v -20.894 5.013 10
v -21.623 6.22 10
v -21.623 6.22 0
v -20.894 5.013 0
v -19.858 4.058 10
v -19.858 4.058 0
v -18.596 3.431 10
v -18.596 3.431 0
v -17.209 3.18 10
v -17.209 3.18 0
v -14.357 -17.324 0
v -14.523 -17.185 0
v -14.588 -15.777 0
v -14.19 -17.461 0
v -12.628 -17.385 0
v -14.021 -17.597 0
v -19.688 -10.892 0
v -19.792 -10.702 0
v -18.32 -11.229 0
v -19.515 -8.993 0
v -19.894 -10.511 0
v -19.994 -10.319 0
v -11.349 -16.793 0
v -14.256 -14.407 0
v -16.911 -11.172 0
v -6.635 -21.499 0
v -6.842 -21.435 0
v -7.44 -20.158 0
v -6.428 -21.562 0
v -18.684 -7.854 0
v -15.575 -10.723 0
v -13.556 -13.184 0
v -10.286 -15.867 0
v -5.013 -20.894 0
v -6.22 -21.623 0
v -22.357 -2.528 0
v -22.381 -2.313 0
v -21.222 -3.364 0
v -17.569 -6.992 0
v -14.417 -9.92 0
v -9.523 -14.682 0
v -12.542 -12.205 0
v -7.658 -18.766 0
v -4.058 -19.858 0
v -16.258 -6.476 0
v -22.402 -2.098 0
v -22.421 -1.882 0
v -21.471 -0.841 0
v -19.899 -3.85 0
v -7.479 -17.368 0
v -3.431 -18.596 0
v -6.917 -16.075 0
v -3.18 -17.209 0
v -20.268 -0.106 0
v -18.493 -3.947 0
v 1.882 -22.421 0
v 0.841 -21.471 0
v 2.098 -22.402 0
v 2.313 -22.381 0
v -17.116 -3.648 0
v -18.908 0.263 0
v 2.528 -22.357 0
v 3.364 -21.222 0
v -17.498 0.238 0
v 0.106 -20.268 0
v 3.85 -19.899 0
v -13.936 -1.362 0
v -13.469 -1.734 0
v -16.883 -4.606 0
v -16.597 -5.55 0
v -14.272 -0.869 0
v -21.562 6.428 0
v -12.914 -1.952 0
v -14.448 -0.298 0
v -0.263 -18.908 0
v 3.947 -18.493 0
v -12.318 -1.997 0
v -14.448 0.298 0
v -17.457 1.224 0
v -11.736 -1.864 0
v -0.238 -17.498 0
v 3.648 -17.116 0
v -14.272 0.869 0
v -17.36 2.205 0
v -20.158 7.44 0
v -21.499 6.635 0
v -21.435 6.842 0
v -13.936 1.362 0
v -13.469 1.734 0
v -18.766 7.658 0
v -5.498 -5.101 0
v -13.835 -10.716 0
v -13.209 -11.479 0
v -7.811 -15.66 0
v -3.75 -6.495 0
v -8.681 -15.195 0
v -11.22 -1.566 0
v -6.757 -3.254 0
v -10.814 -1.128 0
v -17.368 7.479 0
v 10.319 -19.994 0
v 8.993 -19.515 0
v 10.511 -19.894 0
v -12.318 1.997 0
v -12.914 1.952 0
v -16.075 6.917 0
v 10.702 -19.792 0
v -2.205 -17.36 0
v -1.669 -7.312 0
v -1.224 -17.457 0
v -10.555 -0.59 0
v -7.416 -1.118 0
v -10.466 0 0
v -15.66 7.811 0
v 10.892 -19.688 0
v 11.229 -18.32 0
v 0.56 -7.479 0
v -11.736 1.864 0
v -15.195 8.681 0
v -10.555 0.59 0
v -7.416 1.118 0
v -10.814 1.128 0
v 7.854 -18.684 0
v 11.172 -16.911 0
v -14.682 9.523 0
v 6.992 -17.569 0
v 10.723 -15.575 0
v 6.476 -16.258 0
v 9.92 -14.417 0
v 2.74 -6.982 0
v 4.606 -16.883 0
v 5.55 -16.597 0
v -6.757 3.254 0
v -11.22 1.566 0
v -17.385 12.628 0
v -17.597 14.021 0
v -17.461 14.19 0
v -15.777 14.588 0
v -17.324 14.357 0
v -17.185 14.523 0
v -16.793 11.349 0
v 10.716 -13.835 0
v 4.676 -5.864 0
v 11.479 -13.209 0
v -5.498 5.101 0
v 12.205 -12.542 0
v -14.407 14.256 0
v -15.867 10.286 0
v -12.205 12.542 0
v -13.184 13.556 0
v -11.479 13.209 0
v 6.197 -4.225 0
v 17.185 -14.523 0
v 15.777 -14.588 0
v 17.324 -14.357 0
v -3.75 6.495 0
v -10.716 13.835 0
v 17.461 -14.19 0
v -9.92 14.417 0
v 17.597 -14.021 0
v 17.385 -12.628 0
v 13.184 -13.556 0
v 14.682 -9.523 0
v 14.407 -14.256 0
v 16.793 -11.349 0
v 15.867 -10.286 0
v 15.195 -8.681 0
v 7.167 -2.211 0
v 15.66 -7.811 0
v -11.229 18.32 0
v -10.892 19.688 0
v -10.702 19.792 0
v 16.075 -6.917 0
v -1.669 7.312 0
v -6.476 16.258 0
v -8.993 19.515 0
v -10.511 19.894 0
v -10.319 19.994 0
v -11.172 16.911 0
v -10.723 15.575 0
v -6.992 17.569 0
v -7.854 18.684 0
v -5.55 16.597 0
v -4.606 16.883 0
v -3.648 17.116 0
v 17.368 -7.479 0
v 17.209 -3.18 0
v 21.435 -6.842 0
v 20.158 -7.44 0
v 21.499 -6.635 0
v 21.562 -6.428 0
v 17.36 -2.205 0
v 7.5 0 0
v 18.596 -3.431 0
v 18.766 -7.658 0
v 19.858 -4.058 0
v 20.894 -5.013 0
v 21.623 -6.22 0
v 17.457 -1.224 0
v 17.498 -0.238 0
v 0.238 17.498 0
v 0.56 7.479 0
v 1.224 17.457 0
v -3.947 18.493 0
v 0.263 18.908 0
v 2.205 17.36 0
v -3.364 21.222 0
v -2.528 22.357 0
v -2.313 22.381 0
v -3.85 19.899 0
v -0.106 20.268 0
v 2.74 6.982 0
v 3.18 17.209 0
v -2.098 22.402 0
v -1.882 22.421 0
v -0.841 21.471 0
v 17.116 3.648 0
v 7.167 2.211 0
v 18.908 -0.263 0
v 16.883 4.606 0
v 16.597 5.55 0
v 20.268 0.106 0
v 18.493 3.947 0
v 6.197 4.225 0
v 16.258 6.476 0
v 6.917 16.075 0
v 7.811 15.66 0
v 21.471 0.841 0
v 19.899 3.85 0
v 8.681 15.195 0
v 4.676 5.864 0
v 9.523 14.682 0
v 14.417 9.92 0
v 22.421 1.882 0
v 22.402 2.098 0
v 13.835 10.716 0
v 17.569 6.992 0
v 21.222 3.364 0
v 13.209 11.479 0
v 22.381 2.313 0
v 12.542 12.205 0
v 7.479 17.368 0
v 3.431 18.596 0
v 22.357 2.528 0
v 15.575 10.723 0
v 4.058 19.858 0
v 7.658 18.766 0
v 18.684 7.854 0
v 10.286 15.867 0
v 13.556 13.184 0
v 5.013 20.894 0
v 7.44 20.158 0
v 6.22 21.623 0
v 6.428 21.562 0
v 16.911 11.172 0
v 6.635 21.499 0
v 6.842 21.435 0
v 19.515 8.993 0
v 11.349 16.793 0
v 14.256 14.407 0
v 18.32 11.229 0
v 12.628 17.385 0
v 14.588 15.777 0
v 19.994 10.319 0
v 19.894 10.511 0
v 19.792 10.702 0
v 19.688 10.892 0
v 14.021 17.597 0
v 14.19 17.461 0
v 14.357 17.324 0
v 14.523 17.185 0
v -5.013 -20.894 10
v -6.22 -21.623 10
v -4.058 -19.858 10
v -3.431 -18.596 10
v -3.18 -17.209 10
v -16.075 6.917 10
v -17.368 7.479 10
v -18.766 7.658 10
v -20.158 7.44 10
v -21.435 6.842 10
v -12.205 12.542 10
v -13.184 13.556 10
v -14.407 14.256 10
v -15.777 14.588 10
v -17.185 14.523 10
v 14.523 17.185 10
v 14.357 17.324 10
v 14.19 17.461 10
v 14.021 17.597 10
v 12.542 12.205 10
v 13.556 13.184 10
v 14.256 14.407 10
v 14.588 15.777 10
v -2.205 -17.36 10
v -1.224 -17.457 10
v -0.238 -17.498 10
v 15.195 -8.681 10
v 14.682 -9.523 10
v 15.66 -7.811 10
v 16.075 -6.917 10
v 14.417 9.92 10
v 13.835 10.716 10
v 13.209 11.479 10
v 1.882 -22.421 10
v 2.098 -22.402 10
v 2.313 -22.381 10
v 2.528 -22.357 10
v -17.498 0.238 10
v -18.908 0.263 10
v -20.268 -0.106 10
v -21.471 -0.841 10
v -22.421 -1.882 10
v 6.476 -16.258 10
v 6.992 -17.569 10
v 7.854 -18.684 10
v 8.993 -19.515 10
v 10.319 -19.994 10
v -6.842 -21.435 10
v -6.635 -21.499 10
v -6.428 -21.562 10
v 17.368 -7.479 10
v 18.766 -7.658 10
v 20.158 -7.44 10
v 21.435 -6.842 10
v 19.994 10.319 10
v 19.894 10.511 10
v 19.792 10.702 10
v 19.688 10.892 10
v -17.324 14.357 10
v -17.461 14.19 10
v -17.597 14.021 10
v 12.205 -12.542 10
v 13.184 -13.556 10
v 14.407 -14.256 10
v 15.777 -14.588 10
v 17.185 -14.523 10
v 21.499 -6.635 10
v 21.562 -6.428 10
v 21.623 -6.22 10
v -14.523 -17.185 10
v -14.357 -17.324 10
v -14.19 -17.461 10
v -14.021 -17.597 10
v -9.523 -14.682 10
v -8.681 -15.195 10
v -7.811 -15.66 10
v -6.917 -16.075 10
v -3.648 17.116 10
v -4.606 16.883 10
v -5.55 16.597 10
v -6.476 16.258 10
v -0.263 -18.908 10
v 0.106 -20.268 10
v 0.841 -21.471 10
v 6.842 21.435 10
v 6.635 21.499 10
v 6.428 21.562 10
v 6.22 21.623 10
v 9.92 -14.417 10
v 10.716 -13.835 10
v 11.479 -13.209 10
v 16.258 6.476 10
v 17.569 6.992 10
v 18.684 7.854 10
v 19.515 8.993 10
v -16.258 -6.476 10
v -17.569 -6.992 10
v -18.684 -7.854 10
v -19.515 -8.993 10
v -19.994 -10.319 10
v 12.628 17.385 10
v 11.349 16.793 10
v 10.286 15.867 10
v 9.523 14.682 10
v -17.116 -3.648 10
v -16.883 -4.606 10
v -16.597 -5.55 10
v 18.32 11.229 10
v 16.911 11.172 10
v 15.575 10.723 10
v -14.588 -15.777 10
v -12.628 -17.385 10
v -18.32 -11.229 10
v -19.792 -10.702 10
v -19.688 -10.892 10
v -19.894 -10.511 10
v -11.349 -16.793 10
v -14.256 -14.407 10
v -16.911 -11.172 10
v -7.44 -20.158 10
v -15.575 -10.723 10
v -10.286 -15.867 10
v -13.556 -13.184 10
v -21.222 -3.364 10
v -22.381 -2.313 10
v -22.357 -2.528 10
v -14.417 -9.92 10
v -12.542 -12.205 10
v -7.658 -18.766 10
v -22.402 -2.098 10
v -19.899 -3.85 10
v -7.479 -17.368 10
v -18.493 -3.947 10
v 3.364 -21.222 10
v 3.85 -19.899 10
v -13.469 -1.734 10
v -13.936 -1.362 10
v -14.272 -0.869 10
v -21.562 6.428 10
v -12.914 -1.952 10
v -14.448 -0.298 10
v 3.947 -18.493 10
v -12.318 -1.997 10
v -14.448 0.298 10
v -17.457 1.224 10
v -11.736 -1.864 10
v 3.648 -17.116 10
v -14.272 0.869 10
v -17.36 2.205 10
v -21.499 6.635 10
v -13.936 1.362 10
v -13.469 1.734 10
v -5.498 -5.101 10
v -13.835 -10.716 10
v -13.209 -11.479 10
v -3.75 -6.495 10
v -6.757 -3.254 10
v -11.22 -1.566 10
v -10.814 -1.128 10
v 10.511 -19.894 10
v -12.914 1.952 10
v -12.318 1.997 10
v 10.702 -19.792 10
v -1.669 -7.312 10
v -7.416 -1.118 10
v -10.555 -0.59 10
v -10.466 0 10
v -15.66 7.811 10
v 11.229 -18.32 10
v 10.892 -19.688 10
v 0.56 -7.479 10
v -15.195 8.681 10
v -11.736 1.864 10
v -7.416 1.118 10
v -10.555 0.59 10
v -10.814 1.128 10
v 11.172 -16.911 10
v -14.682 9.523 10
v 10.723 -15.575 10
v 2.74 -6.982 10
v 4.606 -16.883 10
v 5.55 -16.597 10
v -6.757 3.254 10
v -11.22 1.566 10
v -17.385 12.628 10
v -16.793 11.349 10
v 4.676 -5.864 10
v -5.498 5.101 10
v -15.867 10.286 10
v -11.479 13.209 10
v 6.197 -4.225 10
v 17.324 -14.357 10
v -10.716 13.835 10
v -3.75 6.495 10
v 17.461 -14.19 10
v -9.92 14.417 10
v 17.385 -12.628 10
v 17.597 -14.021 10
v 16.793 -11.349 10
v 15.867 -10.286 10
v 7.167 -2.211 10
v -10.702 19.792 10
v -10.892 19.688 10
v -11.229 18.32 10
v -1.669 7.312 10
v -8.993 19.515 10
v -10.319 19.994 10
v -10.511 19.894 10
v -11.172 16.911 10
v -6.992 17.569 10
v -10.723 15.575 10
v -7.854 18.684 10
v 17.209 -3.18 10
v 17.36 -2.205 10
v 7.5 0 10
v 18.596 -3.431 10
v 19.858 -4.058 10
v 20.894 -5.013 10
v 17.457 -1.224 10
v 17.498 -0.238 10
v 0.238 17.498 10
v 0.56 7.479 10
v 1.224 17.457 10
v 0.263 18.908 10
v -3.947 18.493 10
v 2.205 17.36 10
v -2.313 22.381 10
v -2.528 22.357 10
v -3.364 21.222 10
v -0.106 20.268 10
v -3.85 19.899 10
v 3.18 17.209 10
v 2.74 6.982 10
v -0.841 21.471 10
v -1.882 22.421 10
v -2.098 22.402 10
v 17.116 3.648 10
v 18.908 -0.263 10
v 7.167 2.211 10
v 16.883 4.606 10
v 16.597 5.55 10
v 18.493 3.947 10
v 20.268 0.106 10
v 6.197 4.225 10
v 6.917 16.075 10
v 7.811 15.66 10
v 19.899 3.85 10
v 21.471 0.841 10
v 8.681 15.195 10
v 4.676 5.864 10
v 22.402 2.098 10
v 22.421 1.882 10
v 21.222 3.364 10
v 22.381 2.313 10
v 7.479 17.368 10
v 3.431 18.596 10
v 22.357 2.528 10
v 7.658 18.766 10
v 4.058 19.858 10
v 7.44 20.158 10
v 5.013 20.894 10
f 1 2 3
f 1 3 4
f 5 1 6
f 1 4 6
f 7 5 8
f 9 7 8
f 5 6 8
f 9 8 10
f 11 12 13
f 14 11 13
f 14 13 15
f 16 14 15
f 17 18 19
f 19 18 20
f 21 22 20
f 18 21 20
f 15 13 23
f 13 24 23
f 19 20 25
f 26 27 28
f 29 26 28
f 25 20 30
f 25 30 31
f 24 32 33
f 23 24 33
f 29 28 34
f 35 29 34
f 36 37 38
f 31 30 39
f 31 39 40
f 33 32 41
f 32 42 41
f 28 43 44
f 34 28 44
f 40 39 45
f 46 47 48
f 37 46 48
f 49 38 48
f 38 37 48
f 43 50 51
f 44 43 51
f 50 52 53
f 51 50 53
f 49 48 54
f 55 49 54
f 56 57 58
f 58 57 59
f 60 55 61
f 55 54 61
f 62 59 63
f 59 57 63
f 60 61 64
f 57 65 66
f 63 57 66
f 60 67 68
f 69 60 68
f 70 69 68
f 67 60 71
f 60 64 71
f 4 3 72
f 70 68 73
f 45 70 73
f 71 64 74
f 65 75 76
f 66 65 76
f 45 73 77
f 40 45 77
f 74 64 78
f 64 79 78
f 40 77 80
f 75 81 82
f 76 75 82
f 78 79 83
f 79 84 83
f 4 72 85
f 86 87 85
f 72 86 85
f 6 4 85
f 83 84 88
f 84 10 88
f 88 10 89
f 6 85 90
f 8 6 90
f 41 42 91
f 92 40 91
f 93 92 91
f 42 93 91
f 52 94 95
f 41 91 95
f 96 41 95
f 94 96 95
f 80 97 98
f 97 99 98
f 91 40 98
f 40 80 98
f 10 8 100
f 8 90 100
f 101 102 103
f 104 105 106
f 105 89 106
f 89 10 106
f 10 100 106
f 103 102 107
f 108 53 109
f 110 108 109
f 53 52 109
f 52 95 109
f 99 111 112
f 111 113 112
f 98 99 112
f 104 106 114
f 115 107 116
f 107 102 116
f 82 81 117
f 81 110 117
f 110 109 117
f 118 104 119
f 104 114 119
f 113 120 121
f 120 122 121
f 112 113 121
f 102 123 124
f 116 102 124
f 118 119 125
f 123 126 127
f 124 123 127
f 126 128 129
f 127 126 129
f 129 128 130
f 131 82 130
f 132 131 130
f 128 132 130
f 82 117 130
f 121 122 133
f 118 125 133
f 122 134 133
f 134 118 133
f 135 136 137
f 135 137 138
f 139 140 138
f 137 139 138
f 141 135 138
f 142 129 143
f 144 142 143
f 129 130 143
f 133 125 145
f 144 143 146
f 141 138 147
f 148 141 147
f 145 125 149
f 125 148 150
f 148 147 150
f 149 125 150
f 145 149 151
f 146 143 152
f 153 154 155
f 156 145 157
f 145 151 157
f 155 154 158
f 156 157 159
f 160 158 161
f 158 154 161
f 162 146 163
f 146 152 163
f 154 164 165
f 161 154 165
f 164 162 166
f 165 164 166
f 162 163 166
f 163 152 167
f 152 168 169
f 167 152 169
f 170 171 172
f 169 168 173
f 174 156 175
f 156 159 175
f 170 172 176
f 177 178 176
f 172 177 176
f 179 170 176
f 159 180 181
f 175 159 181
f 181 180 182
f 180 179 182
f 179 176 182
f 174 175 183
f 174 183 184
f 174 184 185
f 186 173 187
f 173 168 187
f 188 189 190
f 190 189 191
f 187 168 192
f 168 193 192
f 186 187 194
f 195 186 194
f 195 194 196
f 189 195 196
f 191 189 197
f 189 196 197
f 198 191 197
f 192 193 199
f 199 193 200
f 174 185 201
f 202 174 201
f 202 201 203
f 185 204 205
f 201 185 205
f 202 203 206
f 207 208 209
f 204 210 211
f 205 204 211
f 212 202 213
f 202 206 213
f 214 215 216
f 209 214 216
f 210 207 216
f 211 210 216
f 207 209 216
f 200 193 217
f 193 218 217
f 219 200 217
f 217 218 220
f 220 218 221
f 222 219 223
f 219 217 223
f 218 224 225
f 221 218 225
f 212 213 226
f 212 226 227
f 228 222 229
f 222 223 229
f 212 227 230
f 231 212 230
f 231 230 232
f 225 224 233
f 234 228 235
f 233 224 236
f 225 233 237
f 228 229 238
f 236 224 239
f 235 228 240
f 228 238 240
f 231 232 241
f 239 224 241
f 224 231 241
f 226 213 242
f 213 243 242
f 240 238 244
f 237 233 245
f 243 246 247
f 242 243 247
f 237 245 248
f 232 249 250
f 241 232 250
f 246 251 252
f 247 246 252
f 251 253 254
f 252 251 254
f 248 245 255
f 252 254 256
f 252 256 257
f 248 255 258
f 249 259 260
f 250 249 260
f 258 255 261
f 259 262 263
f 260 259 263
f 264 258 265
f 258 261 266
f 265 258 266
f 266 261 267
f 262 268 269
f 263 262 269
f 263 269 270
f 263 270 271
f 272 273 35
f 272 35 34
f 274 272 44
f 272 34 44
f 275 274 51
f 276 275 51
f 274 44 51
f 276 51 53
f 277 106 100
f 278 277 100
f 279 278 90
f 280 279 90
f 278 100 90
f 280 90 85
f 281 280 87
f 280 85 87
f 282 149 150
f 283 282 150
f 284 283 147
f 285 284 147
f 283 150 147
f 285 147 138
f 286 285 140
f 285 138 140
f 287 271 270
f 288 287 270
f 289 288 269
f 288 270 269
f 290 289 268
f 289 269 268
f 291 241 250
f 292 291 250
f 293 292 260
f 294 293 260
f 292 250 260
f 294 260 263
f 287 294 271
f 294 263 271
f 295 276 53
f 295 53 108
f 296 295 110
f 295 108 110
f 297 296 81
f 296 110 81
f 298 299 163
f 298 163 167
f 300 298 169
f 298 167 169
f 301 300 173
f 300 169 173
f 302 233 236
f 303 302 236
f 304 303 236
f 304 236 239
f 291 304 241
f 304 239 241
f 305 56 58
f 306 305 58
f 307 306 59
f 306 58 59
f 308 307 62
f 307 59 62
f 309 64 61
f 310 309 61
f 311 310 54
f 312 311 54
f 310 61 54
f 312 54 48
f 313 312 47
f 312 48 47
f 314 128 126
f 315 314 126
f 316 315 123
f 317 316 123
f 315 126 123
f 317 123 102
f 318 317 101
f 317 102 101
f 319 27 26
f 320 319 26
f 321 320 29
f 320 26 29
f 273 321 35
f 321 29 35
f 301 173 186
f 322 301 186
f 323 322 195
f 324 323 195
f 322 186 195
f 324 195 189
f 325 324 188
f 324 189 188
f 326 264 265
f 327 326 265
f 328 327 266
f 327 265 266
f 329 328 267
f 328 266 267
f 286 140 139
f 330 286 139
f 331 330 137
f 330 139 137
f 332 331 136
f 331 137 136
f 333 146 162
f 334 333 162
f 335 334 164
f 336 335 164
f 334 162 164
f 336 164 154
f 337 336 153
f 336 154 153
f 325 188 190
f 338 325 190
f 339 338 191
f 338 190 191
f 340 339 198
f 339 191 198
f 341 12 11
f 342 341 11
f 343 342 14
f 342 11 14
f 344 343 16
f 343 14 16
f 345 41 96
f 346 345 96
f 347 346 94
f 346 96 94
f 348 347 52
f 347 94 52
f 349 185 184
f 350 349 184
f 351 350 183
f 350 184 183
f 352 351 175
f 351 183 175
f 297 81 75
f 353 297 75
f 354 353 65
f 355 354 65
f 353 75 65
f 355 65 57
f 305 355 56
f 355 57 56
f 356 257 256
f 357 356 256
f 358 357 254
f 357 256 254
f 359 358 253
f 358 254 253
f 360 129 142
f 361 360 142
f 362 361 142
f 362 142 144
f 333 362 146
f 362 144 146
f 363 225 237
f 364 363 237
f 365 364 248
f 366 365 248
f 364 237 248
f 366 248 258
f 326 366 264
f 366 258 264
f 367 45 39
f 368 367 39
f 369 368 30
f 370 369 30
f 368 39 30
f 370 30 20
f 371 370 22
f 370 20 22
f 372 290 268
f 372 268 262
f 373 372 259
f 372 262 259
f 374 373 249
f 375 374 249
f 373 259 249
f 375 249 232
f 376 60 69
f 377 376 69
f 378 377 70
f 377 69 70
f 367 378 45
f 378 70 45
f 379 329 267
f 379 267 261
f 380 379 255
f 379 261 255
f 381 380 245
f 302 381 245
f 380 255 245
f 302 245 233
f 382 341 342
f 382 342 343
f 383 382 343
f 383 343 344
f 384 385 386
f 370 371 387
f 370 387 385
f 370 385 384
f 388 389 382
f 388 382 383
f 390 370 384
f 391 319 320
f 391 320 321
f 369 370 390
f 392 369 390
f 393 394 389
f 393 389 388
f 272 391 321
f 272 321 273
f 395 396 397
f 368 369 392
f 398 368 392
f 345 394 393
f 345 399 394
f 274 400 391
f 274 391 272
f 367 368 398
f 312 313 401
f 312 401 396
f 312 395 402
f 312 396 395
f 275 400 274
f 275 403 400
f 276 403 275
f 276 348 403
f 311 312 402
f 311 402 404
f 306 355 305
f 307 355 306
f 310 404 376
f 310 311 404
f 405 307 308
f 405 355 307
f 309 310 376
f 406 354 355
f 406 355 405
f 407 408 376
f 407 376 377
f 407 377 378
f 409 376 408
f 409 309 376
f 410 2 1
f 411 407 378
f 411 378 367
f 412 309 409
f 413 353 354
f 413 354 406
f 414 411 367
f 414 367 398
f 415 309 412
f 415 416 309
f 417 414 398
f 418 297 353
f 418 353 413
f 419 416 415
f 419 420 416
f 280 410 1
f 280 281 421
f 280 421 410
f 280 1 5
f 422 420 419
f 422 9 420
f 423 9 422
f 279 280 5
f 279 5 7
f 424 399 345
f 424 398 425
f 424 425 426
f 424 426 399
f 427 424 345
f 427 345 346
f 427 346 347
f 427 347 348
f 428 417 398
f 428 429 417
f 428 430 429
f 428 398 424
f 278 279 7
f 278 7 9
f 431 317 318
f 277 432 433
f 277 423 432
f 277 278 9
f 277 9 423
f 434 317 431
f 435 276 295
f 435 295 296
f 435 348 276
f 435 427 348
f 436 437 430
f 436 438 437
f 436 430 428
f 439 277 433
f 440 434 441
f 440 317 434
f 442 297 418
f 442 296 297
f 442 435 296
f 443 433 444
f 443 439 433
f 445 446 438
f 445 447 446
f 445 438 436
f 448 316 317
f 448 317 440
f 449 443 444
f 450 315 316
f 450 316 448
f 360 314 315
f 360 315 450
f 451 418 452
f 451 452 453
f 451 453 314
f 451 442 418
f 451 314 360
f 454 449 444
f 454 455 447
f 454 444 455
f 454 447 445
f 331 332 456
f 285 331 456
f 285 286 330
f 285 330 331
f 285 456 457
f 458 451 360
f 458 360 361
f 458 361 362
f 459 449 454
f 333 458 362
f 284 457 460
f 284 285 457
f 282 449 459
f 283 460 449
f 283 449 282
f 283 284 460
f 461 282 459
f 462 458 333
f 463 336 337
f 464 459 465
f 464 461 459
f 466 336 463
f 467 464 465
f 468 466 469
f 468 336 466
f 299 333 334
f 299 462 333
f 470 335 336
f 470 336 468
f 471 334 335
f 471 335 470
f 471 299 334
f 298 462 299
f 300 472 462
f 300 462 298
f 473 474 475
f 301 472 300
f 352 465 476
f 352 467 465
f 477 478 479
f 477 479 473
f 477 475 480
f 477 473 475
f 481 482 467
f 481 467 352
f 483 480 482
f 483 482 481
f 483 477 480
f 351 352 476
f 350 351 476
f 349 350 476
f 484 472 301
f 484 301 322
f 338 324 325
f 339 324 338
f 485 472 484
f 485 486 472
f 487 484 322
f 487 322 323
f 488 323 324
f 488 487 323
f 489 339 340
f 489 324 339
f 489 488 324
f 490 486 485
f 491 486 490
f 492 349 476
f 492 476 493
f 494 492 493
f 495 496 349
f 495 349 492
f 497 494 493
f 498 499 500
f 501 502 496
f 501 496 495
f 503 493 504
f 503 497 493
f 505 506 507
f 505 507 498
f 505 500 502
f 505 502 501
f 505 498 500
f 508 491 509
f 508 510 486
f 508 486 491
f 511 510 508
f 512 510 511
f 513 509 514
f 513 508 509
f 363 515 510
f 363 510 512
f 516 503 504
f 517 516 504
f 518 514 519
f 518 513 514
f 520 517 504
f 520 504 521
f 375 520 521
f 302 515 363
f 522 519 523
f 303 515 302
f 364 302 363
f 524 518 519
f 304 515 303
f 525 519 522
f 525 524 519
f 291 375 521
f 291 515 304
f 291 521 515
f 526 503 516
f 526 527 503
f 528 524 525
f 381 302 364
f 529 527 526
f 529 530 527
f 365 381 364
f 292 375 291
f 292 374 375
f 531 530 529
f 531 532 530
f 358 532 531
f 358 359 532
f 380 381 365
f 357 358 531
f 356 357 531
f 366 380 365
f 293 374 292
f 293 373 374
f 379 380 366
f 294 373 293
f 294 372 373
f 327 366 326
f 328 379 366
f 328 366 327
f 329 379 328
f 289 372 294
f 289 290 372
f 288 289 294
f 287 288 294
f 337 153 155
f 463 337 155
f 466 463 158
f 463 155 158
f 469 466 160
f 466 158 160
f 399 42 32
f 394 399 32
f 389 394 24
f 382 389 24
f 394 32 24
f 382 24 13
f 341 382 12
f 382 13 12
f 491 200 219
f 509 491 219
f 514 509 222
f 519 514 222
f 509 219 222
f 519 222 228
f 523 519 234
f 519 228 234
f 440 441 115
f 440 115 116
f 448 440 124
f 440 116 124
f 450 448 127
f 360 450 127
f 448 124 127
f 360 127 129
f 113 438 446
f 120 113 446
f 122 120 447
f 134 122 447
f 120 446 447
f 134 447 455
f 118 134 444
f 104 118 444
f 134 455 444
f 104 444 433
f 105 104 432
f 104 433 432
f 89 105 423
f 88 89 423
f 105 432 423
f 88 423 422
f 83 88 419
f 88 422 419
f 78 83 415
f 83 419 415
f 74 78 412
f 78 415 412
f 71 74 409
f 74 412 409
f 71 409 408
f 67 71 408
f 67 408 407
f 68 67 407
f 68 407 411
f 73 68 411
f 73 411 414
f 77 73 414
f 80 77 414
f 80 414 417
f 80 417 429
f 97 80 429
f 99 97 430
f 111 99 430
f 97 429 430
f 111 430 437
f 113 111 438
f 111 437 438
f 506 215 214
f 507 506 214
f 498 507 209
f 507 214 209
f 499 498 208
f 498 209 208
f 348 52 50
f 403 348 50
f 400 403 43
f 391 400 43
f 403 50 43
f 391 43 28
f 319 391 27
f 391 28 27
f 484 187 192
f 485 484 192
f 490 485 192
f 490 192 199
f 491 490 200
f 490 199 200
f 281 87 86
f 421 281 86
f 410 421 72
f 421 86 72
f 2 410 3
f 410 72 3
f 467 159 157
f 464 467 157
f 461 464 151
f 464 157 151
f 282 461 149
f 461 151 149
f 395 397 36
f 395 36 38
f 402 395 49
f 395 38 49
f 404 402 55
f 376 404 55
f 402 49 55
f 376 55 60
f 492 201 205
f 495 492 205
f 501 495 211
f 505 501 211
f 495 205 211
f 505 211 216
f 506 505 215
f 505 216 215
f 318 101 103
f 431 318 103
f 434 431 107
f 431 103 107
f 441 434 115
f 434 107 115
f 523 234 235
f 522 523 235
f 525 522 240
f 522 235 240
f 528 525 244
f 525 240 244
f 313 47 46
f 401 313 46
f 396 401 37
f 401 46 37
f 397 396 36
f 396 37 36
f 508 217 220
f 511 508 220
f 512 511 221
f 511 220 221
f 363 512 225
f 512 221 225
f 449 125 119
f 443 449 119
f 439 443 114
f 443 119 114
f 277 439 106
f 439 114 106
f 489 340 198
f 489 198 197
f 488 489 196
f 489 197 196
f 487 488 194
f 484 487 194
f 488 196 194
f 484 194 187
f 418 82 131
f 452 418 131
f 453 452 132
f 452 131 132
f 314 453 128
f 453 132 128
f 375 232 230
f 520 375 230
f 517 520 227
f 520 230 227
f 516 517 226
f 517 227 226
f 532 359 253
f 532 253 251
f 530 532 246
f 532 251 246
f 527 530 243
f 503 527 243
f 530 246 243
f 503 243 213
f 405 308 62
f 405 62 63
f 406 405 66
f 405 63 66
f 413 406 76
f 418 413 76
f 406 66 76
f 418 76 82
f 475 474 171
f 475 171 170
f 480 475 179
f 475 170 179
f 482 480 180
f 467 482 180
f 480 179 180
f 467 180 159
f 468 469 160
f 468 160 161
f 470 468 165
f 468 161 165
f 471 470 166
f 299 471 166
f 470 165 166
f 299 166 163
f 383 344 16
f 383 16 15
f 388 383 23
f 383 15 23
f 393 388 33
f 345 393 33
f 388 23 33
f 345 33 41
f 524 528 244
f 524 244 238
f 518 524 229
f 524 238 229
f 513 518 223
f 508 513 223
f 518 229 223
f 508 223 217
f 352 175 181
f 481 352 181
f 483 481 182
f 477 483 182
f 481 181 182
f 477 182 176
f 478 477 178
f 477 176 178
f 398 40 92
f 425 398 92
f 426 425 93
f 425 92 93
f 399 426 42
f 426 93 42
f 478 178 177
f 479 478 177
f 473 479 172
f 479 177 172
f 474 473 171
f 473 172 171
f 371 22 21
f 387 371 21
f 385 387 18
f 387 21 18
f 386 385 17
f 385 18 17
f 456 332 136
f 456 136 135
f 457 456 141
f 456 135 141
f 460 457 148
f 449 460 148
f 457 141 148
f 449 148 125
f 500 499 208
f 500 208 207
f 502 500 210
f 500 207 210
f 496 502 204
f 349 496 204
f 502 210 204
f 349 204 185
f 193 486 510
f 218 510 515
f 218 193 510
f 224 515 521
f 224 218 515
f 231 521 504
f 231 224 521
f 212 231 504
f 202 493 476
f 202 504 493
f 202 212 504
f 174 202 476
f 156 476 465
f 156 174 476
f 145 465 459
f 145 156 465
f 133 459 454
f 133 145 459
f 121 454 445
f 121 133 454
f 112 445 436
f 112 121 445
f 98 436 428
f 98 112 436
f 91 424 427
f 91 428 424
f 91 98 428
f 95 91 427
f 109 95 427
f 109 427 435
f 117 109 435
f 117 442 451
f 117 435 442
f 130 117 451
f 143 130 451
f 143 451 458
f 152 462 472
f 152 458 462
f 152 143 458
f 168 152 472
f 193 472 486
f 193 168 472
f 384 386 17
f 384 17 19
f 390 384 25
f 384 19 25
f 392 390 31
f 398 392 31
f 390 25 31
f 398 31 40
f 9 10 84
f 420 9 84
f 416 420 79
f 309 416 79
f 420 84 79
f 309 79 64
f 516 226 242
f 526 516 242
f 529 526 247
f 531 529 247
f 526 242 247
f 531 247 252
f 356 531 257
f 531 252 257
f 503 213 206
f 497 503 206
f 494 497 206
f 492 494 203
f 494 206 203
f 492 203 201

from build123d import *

# Parameters (mm, degrees)
F0_R     = 7.5
F1_DEPTH = 10
F3_COUNT = 16
F3_ANGLE = 337.5
F4_R     = 2.0024063546
F5_DEPTH = 10


with BuildPart() as f1:
    # F0 (on Top) → F1 (new body)
    with BuildSketch(Plane.XY):
        with BuildLine():
            ThreePointArc((-3.6476693986, 17.115621752), (-11.0094456156, -13.6030183135), (17.5, 0))
            ThreePointArc((17.5, 0), (12.4584016864, 12.2897610807), (0.2384882949, 17.4983748769))
            ThreePointArc((0.2384882949, 17.4983748769), (-1.7152999558, 17.4157327168), (-3.6476693986, 17.115621752))
        make_face()
        Circle(F0_R, mode=Mode.SUBTRACT)
        with BuildLine():
            ThreePointArc((-3.6476693986, 17.115621752), (-1.7152999558, 17.4157327168), (0.2384882949, 17.4983748769))
            ThreePointArc((0.2384882949, 17.4983748769), (-0.1063528579, 20.2679092651), (-1.8819552556, 22.4211561793))
            ThreePointArc((-1.8819552556, 22.4211561793), (-2.2053856574, 22.3916563501), (-2.528356566, 22.3574912071))
            ThreePointArc((-2.528356566, 22.3574912071), (-3.8497636276, 19.8992154851), (-3.6476693986, 17.115621752))
        make_face()
    extrude(amount=F1_DEPTH)

    # F3: F1 ×16 about axis
    f3_axis = Axis((0, 0, 13.1933512166), (0, 0, 1))


with BuildPart() as f1_1:
    add(f1.part)
    for i in range(1, F3_COUNT):
        add(f1.part.rotate(f3_axis, i * F3_ANGLE / (F3_COUNT - 1)))

    # F4 (on face) → F5 (cut)
    with BuildSketch(Plane.XY.offset(10)):
        with Locations((-12.467992492, 0)):
            Circle(F4_R)
    extrude(amount=-F5_DEPTH, mode=Mode.SUBTRACT)


solid = f1_1.part
